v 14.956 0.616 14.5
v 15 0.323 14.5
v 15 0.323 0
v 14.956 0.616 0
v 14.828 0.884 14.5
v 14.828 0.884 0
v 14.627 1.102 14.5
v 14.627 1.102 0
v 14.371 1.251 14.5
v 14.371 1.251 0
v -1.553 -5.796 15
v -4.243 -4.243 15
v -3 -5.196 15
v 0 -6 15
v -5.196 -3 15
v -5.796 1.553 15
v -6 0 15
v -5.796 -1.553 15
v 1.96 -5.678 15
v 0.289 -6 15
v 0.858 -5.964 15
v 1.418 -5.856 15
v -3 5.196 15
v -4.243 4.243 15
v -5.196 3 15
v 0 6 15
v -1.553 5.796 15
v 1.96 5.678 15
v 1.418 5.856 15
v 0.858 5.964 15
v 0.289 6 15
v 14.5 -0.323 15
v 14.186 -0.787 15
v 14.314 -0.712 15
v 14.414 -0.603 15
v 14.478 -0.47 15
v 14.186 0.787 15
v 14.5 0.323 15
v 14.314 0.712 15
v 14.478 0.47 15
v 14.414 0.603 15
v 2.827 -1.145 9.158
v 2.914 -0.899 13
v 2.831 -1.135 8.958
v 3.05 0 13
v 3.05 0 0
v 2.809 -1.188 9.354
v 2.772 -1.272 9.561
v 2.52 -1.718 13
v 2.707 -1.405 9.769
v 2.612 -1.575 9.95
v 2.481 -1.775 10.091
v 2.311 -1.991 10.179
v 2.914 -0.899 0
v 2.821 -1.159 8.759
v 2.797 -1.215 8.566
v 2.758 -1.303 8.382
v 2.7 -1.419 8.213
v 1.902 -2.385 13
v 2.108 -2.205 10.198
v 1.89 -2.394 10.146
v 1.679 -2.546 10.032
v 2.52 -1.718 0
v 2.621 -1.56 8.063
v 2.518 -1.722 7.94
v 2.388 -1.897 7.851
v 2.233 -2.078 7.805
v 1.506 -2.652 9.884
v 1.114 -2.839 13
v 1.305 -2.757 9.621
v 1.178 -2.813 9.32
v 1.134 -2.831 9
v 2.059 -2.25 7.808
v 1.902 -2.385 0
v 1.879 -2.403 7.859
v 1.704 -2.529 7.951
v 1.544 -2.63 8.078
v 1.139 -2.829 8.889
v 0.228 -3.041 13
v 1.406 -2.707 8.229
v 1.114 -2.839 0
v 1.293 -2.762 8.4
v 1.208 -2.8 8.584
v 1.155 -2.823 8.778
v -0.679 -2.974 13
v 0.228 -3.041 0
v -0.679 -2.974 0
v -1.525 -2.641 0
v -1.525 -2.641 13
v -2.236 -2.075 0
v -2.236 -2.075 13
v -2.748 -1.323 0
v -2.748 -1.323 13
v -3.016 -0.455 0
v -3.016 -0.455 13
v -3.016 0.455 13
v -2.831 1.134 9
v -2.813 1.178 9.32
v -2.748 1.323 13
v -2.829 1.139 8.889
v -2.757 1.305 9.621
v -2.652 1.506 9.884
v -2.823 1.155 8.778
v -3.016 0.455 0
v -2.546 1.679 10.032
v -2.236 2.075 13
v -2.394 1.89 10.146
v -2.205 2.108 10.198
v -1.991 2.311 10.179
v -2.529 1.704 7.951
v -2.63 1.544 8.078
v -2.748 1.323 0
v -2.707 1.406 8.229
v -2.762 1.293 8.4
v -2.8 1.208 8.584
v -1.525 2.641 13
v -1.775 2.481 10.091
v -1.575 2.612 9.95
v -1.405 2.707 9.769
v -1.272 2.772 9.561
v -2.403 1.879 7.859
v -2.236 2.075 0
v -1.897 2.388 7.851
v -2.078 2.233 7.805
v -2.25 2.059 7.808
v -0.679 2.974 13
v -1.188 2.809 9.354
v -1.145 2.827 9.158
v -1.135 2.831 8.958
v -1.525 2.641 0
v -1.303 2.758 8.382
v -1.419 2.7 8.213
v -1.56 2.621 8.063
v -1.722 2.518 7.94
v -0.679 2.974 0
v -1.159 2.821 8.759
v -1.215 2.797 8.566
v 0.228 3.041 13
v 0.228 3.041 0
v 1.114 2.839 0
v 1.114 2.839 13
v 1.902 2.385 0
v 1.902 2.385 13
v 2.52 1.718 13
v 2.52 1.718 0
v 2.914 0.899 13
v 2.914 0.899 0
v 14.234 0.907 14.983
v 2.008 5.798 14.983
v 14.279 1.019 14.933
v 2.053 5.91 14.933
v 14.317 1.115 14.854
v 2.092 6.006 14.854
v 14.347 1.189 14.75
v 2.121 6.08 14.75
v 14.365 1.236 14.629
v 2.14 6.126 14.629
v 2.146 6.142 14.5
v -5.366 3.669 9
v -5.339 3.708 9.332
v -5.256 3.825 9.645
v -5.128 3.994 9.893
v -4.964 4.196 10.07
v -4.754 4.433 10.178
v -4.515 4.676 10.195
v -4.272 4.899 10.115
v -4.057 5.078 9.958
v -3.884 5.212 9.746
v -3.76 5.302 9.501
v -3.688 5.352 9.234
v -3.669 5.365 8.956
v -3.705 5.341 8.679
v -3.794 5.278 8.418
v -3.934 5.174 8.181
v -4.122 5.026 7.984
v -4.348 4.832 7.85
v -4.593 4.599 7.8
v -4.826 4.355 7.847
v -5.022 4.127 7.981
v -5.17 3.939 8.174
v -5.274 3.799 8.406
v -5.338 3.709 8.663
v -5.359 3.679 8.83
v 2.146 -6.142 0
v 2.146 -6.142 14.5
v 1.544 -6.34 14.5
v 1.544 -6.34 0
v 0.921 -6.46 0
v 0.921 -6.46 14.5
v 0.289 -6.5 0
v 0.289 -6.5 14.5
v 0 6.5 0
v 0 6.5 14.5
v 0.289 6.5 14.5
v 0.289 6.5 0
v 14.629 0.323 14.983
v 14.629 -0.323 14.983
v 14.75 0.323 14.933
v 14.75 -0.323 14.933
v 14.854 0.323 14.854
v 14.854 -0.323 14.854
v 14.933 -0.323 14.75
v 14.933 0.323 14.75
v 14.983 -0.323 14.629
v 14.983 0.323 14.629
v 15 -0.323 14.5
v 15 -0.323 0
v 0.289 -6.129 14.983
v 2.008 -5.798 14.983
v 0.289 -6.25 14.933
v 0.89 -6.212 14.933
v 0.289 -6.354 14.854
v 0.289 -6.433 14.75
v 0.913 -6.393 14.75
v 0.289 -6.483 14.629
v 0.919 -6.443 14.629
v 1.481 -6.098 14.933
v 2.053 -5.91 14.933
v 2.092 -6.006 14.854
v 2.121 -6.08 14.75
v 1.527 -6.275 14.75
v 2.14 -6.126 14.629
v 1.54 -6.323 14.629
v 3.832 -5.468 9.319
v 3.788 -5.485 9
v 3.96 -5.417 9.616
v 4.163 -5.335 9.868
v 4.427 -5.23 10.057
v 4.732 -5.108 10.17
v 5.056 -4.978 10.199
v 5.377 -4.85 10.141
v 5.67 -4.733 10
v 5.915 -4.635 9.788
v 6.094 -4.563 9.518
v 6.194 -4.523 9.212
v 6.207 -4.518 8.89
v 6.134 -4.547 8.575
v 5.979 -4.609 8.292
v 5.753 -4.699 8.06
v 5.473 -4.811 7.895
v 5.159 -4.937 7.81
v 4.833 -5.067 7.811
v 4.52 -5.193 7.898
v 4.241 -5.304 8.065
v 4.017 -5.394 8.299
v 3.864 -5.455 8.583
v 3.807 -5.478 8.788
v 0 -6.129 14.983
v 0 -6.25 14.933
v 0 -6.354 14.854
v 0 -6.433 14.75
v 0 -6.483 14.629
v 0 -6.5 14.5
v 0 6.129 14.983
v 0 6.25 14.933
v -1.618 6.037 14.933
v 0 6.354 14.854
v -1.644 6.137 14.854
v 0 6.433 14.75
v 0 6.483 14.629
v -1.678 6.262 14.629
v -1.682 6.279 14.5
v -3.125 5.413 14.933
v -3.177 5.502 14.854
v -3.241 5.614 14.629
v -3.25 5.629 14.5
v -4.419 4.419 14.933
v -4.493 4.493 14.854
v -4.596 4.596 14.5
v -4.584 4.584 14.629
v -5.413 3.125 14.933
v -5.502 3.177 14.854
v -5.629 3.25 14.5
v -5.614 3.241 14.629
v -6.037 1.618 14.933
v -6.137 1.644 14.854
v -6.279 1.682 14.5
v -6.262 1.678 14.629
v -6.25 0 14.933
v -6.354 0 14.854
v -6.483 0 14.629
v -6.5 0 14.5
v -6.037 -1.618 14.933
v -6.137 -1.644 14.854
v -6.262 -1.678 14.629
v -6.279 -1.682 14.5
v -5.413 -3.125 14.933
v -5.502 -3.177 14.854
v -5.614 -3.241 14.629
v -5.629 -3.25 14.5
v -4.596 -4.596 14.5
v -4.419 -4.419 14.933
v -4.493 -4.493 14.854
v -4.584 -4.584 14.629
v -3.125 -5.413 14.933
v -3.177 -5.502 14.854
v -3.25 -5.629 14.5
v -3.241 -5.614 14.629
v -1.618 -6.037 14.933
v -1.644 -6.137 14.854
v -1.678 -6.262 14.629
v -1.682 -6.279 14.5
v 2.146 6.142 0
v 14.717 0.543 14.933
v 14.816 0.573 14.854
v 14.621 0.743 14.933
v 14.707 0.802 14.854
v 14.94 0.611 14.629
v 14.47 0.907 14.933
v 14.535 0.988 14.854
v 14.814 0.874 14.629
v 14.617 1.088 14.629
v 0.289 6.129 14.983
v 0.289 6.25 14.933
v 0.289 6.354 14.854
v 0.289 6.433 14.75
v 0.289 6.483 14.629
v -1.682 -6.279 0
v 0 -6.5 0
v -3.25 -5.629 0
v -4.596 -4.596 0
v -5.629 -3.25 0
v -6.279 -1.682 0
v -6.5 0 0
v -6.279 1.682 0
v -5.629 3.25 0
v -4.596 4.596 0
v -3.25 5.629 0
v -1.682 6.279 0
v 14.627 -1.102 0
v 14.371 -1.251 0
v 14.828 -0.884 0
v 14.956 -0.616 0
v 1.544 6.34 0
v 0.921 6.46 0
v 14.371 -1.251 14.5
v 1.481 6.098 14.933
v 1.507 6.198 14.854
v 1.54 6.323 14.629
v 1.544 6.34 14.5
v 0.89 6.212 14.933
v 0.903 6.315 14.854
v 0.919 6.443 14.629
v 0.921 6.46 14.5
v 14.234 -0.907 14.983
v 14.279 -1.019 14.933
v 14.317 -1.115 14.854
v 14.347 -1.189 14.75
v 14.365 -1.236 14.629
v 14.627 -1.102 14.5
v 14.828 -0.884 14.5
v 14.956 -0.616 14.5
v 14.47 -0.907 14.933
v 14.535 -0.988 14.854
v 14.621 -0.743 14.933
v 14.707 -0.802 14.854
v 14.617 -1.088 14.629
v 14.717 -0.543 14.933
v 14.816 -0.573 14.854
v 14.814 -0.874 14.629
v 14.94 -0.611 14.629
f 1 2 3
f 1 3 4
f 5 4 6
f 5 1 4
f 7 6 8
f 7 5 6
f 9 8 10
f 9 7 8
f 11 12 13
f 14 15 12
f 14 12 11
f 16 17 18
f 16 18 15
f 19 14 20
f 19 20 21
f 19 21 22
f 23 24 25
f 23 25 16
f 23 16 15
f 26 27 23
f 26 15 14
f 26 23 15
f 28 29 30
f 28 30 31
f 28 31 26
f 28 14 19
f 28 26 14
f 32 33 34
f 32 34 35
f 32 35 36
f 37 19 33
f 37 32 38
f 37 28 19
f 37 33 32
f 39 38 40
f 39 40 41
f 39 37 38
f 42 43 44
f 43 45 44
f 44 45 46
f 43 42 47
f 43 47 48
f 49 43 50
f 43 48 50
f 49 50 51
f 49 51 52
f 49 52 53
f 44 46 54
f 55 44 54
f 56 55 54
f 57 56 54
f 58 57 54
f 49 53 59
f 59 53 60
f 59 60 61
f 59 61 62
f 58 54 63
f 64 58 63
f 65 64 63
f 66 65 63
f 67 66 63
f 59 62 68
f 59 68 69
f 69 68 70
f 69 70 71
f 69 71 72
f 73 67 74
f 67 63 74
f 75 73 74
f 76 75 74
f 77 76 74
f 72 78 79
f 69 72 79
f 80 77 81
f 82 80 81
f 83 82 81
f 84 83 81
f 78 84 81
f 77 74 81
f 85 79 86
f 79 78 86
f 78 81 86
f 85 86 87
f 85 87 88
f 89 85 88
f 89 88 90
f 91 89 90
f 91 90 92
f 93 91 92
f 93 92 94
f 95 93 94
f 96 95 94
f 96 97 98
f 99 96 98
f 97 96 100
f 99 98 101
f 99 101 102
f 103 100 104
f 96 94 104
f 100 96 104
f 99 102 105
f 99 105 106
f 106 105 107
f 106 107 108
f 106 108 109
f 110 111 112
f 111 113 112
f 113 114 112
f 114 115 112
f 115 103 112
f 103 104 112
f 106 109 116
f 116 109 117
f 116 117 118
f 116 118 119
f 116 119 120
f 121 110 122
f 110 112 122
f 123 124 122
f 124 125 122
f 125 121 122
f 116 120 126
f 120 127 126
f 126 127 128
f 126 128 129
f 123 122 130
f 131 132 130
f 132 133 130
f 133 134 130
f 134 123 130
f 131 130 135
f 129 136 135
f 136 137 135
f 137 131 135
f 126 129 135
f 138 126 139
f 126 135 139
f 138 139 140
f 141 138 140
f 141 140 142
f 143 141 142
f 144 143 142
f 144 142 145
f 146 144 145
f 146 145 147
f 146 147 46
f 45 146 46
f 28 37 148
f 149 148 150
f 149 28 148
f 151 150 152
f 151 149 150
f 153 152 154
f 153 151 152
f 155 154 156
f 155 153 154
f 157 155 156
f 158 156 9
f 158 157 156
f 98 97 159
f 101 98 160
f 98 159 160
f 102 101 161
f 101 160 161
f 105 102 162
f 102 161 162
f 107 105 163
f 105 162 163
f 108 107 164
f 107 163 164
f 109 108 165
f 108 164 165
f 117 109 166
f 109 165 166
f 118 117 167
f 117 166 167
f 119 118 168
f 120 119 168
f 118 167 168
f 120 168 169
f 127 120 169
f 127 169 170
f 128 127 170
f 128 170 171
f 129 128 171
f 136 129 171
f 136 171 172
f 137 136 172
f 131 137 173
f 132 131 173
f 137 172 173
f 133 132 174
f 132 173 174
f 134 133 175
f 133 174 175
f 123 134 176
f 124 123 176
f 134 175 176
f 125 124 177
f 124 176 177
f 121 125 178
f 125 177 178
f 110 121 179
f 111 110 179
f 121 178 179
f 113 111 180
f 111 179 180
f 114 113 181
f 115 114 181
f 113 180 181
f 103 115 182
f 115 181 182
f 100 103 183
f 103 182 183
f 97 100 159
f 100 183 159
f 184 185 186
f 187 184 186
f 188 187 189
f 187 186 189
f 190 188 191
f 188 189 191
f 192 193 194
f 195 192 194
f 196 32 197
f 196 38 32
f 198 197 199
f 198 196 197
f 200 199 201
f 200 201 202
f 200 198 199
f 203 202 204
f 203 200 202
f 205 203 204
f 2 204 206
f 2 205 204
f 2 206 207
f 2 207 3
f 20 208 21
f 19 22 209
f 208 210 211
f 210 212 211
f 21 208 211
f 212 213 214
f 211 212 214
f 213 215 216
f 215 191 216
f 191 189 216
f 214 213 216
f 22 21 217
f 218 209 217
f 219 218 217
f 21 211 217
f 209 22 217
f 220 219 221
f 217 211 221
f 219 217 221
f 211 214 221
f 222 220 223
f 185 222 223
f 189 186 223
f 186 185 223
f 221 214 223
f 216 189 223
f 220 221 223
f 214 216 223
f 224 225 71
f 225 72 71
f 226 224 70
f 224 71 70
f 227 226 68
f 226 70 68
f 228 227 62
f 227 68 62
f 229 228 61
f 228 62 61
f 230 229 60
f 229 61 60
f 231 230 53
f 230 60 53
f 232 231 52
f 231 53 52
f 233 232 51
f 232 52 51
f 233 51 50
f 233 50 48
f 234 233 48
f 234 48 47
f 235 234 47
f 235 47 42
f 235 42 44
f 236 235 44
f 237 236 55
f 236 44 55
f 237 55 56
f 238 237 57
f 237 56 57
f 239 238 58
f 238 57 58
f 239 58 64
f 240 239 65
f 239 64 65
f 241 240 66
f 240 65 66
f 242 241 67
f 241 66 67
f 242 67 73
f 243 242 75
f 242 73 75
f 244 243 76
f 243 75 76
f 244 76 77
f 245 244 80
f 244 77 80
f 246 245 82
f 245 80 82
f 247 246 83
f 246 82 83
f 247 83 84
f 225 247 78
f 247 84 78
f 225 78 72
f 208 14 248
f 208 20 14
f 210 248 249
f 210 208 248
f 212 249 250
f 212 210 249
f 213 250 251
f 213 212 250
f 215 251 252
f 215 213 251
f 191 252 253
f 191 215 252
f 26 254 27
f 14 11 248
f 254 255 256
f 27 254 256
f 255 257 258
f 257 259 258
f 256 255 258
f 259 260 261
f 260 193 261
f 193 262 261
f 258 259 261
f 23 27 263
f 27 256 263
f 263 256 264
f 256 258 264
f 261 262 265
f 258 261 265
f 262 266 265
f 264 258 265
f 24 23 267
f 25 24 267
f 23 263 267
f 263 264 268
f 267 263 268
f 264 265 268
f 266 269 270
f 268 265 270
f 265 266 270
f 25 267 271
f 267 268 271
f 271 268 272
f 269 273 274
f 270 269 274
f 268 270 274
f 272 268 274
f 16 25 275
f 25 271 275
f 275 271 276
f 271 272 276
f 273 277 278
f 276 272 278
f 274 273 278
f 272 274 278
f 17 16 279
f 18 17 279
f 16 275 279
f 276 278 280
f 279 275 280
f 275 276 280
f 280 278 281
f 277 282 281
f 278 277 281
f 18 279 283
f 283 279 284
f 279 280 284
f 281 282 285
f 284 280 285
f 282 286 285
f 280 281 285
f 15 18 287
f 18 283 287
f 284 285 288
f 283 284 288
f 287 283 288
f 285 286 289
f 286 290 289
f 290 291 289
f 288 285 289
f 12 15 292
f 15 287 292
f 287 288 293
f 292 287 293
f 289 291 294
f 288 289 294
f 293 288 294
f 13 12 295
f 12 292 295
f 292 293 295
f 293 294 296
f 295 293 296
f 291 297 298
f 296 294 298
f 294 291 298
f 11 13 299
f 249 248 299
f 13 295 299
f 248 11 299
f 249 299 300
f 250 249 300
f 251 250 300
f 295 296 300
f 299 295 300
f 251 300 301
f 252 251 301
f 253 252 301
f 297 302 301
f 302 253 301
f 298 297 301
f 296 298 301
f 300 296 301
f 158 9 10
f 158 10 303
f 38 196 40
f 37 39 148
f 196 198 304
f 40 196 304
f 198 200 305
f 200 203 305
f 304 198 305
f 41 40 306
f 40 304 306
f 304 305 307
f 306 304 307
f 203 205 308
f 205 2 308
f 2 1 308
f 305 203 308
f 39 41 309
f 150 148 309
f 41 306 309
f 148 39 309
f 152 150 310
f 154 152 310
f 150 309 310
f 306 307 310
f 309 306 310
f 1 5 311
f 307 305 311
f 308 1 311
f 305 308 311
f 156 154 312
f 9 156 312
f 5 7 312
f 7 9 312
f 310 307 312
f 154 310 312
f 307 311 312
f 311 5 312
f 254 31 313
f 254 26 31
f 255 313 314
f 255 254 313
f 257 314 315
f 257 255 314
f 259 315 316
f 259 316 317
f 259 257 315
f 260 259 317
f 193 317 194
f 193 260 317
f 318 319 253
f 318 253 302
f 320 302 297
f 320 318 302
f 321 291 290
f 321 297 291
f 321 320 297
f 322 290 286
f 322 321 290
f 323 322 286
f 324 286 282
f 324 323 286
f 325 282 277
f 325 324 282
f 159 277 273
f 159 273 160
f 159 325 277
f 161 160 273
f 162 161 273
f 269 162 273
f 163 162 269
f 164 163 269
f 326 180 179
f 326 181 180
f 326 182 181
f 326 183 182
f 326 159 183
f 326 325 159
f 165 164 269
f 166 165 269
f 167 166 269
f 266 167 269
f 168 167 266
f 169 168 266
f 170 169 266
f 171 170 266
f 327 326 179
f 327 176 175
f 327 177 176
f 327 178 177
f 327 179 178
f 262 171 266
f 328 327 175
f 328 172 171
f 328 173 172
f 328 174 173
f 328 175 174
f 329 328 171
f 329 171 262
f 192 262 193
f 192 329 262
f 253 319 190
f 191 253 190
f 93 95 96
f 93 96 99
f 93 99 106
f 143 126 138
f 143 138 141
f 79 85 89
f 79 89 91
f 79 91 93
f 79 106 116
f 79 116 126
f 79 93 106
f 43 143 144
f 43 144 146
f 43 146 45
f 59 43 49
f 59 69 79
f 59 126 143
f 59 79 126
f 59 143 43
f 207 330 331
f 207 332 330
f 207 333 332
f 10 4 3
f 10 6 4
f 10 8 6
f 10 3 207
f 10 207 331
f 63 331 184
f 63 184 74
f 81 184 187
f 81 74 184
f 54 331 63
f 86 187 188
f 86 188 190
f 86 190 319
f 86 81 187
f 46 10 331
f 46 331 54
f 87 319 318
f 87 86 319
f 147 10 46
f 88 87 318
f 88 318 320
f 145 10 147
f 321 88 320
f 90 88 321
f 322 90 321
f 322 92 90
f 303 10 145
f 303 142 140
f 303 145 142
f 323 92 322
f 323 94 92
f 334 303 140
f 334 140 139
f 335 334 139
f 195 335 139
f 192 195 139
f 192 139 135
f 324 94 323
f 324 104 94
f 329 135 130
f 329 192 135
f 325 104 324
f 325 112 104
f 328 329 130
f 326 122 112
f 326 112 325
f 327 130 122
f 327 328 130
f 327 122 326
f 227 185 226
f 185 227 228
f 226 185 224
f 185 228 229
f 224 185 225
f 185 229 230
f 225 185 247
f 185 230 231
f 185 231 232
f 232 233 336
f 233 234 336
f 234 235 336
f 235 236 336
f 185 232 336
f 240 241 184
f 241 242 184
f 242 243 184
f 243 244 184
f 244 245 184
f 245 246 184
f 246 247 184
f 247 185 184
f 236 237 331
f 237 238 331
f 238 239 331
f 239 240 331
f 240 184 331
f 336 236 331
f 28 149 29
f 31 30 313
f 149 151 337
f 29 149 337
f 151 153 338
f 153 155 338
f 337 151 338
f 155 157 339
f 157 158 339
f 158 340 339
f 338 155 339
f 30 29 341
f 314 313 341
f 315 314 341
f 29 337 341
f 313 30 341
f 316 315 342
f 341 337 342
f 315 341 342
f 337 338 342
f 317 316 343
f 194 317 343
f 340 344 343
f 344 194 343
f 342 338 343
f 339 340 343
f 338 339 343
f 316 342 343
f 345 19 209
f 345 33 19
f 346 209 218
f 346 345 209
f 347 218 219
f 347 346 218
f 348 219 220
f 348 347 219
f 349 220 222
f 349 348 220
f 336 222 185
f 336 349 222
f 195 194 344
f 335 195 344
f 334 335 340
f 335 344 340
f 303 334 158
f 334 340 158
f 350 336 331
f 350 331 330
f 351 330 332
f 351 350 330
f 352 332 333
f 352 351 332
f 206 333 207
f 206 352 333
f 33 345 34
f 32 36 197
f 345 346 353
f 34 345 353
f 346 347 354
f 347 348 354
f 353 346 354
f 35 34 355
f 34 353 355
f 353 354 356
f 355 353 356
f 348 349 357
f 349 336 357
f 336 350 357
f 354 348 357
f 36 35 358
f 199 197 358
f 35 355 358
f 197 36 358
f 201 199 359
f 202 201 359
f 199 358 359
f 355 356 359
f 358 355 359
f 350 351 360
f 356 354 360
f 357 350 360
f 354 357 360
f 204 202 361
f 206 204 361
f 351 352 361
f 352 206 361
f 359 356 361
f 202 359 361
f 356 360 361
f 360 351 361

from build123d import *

# Parameters (mm, degrees)
F2_W      = 1.2519505165
F2_H      = 13
F3_DEPTH  = 15
F4_R      = 5
F5_R      = 1
F6_R      = 3.05
F7_DEPTH  = 13
F8_R      = 0.5
F10_R     = 1.2
F11_DEPTH = 12.5


with BuildPart() as f1:
    # F0 (on Front) → F1 (revolve)
    with BuildSketch(Plane.XZ):
        Polygon((-5, 0), (0, 0), (0, 15), (-6.5, 15), (-6.5, 0), align=None)
    revolve(axis=Axis((0, 0, -3.6677676575), (0, 0, -1)))

    # F2 (on Top) → F3 (join)
    with BuildSketch(Plane.XY):
        with BuildLine():
            Line((0, -6.5), (0, 6.5))
            ThreePointArc((0, 6.5), (-6.5, 0), (0, -6.5))
        make_face()
        with Locations((0.6259752583, 0)):
            Rectangle(F2_W, F2_H)
        Polygon((15, 1), (1.2519505165, 6.5), (1.2519505165, -6.5), (15, -1), align=None)
    extrude(amount=F3_DEPTH)

    # F4
    f4_edges = [f1.edges().sort_by_distance(p)[0] for p in [
        (1.251951, 6.5, 7.5),
        (1.251951, -6.5, 7.5),
    ]]
    fillet(f4_edges, radius=F4_R)

    # F5
    f5_edges = [f1.edges().sort_by_distance(p)[0] for p in [
        (15, 1, 7.5),
        (15, -1, 7.5),
    ]]
    fillet(f5_edges, radius=F5_R)

    # F6 (on face) → F7 (cut)
    with BuildSketch(Plane(origin=(0, 0, 0), x_dir=(1, 0, 0), z_dir=(0, 0, -1))):
        Circle(F6_R)
    extrude(amount=-F7_DEPTH, mode=Mode.SUBTRACT)

    # F8
    f8_edges = [f1.edges().sort_by_distance(p)[0] for p in [
        (8.258764, -3.696877, 15),
        (14.828081, -0.883611, 15),
        (1.234569, -6.409759, 15),
        (15, 0, 15),
        (0.144456, -6.5, 15),
        (14.828081, 0.883611, 15),
        (-6.5, 0, 15),
        (8.258764, 3.696877, 15),
        (0.144456, 6.5, 15),
        (1.234569, 6.409759, 15),
    ]]
    fillet(f8_edges, radius=F8_R)

    # F10 (on line) → F11 (cut, symmetric)
    with BuildSketch(Plane(origin=(0, 0, 0), x_dir=(-0.7071067812, -0.7071067812, 0), z_dir=(-0.7071067812, 0.7071067812, 0))):
        with Locations((0, 9)):
            Circle(F10_R)
    extrude(amount=F11_DEPTH, both=True, mode=Mode.SUBTRACT)


solid = f1.part
